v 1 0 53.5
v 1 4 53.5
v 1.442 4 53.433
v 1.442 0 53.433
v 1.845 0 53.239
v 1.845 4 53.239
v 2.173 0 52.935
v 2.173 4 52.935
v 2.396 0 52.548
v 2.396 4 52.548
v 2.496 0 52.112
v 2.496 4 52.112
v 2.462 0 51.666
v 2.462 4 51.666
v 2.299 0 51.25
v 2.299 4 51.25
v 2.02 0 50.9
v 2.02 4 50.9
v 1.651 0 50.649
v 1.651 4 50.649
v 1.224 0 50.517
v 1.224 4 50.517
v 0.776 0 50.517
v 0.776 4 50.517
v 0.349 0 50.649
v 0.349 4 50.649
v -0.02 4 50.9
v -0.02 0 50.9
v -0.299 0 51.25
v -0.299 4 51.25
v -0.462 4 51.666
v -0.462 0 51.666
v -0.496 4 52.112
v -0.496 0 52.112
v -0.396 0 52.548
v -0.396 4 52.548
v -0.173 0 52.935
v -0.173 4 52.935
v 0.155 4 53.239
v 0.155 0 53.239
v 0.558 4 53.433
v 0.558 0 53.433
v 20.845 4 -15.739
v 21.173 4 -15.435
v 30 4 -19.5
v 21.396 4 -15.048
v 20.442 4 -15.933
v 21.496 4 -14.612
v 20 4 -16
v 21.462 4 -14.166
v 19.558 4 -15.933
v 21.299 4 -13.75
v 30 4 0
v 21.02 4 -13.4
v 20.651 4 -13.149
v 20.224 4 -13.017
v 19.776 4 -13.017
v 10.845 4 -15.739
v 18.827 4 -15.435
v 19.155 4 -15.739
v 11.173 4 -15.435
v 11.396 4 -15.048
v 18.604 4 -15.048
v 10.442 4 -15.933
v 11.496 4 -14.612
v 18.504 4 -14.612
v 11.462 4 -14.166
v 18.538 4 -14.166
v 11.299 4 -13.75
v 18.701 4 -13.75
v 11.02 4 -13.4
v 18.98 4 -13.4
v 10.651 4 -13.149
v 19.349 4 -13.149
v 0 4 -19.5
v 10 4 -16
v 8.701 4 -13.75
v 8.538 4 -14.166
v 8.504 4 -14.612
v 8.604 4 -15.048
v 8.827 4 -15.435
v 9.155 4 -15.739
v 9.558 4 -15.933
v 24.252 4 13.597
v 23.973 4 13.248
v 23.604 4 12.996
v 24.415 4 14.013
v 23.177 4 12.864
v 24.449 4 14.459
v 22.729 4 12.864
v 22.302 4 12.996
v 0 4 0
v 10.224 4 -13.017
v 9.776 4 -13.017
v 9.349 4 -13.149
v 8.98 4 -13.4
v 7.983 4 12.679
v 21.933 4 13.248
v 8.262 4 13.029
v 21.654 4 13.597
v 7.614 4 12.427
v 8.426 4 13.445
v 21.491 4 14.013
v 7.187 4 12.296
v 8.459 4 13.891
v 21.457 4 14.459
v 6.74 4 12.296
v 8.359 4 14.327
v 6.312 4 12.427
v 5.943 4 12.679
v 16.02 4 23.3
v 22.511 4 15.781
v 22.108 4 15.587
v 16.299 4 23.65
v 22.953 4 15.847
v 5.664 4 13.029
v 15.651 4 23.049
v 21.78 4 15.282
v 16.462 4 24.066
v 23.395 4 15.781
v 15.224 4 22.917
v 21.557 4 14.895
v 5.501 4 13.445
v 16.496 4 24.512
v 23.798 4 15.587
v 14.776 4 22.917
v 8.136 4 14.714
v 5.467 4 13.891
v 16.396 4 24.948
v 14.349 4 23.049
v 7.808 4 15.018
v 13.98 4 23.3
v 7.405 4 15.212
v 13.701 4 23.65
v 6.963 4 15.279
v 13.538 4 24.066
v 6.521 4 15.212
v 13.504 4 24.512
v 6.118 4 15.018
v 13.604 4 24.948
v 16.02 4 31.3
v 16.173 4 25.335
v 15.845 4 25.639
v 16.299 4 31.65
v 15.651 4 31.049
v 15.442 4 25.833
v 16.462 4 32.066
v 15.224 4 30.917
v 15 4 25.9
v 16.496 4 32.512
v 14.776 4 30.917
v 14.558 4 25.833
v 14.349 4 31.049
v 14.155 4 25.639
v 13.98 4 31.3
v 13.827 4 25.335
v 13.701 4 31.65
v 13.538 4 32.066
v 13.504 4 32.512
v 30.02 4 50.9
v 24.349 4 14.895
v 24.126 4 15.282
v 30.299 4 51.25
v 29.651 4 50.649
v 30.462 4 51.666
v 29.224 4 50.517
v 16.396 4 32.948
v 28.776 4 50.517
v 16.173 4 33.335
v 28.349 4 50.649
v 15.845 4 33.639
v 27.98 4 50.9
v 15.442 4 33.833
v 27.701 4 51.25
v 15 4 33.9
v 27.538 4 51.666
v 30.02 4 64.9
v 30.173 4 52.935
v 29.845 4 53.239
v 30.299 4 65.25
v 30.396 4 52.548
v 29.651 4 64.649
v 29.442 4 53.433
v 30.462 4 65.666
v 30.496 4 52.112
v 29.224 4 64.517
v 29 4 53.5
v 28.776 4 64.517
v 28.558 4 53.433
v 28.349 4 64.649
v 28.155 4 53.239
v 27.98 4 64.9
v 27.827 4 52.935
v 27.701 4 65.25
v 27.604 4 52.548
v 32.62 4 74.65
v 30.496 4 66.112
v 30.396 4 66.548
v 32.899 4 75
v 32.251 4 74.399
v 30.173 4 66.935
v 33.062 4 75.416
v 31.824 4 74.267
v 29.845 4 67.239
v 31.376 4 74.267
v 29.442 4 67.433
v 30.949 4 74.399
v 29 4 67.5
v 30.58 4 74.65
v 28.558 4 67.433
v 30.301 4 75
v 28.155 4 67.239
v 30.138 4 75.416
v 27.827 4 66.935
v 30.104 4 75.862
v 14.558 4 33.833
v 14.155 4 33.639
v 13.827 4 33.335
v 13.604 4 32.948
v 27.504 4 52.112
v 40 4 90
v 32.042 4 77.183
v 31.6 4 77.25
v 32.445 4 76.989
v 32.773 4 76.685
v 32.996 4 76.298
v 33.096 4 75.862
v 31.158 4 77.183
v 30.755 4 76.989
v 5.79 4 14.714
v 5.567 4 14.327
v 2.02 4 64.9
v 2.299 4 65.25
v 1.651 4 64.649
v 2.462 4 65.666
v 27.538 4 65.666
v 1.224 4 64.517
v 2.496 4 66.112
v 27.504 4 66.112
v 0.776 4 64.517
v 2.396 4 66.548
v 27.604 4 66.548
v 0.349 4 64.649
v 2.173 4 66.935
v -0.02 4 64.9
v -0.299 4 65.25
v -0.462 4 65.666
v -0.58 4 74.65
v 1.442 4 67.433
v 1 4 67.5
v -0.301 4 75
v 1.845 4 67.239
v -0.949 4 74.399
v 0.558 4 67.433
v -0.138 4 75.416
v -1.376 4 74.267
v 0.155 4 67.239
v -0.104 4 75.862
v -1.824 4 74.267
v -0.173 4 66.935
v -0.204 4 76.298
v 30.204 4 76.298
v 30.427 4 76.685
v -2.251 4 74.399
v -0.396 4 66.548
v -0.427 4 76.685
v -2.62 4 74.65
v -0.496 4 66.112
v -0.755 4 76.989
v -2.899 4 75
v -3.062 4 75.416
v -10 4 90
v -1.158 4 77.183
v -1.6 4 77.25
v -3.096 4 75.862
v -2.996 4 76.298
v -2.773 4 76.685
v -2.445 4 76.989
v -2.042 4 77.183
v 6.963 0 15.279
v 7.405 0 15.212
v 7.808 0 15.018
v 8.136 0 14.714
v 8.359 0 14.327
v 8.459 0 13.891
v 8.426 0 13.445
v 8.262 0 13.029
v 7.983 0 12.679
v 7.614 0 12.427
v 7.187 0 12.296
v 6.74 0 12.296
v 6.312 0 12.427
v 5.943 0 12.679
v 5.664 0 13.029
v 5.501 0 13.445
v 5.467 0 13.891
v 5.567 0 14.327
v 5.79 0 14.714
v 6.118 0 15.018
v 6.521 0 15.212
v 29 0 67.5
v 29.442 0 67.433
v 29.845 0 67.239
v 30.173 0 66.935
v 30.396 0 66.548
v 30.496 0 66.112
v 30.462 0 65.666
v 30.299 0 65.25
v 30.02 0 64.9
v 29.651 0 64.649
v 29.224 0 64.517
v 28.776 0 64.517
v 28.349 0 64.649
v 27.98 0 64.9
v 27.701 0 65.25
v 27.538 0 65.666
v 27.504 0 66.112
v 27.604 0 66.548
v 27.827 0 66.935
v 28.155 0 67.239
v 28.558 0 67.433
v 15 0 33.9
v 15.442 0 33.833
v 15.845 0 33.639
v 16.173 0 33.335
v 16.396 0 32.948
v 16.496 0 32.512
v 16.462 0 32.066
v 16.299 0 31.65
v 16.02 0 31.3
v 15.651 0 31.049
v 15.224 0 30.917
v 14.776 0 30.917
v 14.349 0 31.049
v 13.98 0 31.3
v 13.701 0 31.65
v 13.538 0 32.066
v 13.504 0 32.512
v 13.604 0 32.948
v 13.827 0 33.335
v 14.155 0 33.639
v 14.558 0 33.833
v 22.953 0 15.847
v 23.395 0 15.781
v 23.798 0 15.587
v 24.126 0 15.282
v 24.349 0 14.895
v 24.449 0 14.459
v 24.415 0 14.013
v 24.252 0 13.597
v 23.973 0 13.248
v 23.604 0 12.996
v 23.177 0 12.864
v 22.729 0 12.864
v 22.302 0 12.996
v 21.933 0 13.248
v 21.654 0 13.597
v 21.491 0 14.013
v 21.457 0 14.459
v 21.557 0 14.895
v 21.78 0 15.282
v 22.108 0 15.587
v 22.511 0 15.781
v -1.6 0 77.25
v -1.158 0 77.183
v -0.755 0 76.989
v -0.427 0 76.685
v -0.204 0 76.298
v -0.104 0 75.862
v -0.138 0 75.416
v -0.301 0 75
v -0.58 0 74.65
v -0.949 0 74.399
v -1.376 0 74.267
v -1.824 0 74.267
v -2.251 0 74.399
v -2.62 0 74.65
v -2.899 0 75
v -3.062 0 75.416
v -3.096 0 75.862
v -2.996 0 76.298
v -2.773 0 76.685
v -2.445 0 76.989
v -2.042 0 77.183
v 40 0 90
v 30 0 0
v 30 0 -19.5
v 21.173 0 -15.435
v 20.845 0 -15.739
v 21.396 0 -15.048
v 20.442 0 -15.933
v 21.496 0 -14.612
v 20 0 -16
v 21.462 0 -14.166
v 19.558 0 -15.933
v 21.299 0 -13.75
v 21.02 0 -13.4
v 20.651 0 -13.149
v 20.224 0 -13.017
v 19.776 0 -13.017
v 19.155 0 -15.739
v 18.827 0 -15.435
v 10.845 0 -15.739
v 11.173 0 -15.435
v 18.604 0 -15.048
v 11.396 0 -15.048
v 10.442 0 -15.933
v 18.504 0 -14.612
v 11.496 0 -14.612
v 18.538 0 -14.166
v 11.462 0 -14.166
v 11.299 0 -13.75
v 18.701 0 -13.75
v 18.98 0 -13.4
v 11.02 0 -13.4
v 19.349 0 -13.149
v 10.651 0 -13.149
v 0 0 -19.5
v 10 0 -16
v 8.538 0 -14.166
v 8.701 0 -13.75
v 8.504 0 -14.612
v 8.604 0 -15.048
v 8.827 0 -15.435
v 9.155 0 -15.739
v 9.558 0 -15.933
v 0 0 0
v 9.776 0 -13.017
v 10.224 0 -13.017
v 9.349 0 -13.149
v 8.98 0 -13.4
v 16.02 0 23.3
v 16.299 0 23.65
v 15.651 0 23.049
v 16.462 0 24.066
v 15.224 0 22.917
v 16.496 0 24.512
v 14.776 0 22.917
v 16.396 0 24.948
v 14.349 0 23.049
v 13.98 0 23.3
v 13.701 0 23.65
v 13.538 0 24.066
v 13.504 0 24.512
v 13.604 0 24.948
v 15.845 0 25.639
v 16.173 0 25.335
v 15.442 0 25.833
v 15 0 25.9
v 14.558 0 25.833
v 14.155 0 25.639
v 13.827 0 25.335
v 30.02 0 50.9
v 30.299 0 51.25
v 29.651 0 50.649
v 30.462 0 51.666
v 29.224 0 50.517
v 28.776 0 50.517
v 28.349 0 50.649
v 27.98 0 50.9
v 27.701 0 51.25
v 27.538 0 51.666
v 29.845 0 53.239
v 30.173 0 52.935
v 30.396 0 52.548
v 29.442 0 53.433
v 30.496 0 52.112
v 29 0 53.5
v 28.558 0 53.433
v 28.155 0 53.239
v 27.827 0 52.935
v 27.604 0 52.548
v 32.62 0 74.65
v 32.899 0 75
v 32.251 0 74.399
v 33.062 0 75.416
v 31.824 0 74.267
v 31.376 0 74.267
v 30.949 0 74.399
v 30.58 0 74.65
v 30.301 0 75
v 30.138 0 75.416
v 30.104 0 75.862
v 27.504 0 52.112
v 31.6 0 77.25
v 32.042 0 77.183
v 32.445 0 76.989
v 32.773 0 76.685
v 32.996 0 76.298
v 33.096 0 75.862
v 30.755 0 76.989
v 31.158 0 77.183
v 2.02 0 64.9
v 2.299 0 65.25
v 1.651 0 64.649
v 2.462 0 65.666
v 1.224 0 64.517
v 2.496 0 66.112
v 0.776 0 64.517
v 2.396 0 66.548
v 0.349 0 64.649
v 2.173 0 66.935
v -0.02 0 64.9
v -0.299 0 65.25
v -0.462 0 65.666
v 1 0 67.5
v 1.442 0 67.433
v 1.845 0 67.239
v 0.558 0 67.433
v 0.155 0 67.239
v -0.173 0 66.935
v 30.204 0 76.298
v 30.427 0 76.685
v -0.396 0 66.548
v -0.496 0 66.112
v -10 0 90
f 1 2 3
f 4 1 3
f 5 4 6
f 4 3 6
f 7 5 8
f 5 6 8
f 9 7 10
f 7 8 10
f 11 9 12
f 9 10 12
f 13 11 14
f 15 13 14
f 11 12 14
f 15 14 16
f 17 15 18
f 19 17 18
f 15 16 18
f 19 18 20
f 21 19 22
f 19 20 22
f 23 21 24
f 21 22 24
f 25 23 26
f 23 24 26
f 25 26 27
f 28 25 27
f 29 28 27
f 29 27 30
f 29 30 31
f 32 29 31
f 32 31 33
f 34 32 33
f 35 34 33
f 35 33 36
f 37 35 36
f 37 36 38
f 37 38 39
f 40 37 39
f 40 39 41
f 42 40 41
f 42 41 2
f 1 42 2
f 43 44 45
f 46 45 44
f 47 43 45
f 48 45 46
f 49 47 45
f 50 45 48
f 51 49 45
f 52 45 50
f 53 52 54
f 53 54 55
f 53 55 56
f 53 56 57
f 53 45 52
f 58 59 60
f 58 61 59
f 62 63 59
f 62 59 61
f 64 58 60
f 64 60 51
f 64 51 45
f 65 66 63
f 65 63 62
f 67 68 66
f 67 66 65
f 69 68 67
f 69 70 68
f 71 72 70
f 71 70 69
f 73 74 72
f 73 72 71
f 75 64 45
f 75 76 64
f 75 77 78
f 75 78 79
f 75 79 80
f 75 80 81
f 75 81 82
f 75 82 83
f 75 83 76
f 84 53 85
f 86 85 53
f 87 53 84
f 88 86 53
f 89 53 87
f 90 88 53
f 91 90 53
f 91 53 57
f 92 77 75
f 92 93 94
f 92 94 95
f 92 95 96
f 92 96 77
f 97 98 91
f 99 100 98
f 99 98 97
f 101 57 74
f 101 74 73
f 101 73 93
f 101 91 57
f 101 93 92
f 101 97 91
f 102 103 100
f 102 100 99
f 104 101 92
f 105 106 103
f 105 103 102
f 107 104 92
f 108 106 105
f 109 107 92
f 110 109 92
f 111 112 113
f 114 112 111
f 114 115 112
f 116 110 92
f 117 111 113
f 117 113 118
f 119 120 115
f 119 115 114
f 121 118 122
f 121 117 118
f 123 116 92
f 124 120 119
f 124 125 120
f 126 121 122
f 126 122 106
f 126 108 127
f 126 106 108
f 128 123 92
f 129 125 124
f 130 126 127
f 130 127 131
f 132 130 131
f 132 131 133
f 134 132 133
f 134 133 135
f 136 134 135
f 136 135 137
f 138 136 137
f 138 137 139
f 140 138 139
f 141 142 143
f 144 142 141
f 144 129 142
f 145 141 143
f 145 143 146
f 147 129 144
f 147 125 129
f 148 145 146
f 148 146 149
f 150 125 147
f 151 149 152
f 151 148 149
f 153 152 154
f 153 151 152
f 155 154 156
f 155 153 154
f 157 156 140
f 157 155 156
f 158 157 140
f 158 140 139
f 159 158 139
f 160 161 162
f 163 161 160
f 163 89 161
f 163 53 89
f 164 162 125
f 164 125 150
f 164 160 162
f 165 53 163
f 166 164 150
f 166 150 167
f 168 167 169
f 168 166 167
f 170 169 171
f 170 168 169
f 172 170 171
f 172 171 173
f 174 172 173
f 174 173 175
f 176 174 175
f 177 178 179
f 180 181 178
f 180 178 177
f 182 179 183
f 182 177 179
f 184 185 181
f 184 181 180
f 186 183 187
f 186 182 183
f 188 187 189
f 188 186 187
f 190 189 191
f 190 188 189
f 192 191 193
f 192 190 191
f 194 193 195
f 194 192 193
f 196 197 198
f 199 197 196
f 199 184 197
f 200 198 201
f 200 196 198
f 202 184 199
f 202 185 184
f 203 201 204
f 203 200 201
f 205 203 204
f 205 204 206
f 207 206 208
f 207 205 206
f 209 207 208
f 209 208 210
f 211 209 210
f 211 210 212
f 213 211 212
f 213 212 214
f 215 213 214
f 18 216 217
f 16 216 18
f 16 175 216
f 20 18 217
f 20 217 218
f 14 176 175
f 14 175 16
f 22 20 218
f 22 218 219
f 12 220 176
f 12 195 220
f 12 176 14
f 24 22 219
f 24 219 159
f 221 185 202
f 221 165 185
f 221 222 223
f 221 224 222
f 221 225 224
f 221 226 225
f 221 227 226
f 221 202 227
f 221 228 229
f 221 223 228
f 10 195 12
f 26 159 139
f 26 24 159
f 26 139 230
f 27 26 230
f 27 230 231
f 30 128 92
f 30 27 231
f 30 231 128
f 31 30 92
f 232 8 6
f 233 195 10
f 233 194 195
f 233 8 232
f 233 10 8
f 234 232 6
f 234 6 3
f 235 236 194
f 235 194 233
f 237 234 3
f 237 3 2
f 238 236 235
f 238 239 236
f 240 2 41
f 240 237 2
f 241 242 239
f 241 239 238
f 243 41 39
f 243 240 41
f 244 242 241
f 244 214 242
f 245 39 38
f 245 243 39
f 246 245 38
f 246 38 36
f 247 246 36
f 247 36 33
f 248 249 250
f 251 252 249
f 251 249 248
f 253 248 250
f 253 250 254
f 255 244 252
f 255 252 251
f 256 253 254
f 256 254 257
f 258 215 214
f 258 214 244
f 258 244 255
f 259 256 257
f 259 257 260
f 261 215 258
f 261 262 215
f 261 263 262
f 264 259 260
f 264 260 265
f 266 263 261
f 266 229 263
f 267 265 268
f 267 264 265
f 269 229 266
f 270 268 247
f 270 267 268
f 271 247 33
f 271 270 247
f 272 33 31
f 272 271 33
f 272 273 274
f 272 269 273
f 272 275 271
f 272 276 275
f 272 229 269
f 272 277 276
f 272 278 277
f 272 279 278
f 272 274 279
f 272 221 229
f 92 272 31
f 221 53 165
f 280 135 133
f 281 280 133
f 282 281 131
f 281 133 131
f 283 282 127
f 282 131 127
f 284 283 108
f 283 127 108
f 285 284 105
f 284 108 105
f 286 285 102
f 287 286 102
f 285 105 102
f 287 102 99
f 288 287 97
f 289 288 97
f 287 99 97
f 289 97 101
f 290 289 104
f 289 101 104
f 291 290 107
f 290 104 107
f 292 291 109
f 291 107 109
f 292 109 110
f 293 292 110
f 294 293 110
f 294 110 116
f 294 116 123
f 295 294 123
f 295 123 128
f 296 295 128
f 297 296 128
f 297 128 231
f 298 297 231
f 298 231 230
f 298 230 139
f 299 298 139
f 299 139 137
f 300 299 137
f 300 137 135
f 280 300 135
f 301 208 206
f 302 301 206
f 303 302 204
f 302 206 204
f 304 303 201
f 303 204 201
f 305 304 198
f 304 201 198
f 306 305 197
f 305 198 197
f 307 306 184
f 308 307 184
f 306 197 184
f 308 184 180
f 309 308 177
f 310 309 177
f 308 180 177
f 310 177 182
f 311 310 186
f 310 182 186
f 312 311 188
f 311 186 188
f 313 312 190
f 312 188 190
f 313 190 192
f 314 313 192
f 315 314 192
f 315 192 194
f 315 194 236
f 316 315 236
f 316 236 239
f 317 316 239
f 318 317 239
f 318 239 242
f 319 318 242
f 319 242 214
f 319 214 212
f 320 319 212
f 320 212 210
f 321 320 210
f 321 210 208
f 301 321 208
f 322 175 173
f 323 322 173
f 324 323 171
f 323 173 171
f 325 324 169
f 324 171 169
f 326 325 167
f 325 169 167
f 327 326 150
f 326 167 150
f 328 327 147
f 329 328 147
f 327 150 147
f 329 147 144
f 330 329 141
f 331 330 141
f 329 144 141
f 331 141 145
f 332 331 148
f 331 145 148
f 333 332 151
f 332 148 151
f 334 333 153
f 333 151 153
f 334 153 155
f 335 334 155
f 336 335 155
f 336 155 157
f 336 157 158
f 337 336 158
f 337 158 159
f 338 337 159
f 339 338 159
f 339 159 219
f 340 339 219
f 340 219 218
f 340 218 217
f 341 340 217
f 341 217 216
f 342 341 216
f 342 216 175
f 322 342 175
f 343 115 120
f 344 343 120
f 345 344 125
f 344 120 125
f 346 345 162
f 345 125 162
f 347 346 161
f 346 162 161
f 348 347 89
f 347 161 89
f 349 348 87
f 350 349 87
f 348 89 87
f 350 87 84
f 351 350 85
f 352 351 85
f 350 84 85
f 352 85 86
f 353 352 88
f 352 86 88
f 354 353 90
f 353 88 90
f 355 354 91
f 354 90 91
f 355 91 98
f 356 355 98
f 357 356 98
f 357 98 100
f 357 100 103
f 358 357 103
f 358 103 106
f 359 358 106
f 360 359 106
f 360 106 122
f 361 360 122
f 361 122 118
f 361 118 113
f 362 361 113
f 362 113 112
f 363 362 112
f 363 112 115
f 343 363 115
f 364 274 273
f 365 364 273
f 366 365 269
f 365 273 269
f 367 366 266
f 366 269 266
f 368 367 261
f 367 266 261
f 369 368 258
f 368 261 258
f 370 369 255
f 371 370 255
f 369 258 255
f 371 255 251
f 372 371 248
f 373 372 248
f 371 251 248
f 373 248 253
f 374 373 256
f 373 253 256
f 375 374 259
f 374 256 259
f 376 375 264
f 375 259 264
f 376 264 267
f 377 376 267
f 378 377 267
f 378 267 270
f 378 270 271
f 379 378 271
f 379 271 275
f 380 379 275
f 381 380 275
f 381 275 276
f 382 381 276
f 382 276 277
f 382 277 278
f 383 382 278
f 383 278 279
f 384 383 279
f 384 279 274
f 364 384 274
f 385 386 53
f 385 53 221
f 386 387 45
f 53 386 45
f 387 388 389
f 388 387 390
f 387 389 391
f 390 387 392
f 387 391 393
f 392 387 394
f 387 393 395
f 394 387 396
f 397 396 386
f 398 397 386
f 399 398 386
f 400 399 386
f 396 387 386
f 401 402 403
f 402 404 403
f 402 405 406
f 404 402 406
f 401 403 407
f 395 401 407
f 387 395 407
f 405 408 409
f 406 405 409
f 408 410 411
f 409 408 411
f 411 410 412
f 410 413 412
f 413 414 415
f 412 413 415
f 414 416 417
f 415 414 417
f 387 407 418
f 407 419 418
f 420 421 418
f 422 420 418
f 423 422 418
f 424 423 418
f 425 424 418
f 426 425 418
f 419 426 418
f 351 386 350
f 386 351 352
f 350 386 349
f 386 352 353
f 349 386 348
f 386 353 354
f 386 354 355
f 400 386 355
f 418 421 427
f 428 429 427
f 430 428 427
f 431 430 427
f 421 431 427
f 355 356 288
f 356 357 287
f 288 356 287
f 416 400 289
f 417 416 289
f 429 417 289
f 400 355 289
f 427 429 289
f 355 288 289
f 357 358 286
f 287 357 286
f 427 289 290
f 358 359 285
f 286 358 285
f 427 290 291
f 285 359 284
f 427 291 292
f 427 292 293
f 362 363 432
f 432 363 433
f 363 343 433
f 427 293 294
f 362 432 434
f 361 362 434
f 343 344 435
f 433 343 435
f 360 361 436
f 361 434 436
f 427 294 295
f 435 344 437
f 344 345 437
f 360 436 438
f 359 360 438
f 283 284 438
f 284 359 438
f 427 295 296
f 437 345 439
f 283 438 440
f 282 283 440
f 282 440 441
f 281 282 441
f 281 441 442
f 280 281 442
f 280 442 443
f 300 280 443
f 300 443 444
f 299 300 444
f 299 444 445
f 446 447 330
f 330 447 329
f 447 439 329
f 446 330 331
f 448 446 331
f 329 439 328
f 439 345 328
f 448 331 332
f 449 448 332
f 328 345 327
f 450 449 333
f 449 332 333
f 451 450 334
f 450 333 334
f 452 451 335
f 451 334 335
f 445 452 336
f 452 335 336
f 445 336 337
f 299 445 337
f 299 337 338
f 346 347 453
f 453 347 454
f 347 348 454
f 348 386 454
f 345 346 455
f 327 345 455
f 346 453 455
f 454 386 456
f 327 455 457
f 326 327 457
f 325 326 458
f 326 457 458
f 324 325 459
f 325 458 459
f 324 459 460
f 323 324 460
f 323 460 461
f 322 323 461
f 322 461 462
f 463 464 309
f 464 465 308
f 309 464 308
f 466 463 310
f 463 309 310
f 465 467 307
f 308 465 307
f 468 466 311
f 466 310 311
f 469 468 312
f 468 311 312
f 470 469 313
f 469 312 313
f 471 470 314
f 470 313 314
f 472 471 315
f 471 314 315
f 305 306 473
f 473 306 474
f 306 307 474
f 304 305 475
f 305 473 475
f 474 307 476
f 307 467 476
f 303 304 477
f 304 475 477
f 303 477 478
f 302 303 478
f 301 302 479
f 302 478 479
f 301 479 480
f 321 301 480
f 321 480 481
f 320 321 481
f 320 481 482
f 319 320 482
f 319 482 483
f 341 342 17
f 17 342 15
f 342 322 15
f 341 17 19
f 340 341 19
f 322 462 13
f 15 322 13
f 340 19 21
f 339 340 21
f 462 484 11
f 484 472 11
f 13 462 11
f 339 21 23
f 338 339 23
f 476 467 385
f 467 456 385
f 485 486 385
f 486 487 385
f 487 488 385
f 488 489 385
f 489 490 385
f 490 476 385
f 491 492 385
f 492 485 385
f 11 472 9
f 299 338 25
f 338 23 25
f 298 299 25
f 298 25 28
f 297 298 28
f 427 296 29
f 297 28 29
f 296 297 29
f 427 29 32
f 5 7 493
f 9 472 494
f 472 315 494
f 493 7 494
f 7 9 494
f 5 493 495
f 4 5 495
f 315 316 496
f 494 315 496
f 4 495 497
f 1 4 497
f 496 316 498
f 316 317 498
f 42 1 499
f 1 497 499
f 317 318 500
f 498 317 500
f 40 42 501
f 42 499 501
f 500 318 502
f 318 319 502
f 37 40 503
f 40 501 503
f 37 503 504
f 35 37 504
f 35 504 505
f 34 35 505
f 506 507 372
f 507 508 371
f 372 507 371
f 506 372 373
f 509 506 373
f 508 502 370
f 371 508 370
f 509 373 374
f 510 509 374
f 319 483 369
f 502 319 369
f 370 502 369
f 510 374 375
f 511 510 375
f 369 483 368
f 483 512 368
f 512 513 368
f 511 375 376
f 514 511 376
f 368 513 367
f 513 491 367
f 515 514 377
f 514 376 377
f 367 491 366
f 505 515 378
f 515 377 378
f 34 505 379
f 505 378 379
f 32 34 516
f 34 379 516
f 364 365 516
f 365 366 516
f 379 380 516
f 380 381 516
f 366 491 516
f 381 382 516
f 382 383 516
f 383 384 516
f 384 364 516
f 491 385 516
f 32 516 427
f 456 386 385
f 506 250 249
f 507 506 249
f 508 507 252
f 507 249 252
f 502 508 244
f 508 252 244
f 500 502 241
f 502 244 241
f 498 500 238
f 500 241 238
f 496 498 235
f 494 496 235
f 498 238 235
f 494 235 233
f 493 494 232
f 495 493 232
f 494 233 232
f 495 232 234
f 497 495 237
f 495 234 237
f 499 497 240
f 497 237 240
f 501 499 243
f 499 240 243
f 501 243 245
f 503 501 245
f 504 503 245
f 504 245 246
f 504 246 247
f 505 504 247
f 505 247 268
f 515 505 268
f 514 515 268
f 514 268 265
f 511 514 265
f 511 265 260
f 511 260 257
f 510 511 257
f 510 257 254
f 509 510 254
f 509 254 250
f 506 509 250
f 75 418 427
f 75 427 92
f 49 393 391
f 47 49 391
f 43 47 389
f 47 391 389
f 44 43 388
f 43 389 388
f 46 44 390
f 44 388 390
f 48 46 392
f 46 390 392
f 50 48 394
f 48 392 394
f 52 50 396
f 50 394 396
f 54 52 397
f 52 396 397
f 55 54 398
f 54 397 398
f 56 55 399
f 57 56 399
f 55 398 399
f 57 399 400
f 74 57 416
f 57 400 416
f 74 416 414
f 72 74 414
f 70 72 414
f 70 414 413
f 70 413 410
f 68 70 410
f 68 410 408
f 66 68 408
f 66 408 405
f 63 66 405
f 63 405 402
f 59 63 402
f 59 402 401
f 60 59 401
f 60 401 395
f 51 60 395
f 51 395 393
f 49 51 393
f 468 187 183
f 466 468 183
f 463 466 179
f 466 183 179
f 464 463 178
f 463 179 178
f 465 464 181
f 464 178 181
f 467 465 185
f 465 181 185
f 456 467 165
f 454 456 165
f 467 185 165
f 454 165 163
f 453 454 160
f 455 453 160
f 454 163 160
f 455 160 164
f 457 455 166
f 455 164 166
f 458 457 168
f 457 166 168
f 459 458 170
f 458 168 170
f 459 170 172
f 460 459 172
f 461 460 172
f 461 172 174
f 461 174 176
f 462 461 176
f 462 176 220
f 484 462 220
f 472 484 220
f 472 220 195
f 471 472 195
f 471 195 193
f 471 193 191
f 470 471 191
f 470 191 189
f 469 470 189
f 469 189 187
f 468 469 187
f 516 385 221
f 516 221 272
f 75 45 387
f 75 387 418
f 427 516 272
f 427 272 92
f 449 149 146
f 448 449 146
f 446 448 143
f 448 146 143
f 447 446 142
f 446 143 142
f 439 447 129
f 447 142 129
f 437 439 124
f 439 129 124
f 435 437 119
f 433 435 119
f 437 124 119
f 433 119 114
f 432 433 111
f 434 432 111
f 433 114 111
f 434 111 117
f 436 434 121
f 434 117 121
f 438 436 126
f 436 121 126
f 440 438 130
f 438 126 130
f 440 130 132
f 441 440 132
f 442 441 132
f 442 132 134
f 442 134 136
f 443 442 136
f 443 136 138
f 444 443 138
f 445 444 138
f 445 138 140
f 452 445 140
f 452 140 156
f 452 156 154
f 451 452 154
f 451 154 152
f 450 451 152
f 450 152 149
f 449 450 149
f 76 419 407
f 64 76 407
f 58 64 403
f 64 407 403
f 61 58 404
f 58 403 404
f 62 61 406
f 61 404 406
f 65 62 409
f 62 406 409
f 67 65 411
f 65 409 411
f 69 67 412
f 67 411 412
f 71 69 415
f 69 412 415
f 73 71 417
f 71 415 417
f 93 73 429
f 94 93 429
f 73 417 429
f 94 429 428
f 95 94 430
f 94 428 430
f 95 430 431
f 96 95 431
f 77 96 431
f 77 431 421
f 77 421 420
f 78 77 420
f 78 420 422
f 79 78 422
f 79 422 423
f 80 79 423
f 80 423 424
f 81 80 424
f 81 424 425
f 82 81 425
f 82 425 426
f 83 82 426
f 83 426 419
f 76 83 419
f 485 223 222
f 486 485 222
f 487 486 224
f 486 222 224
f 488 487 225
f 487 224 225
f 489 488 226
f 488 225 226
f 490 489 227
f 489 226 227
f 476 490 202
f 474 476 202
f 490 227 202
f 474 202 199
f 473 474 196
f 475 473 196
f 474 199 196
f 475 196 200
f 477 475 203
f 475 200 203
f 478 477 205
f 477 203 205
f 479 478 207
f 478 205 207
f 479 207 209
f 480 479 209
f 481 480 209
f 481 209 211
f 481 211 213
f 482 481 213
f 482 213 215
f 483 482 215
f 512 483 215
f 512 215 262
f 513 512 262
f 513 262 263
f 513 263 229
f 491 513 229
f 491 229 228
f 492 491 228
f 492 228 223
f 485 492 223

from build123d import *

# Parameters (mm, degrees)
EXTRUDE_1_DEPTH     = 4
SKETCH_4_R          = 1.5
CUT_EXTRUDE_3_DEPTH = 99.569772243
SKETCH_5_R          = 1.5
CUT_EXTRUDE_4_DEPTH = 99.569772243
SKETCH_9_R          = 1.5
CUT_EXTRUDE_6_DEPTH = 10
SKETCH_10_W         = 30
SKETCH_10_H         = 4
EXTRUDE_2_DEPTH     = 19.5
SKETCH_11_R         = 1.5
CUT_EXTRUDE_7_DEPTH = 99.569772243


with BuildPart() as part:
    # 草图1 → 凸台-拉伸1 (new body)
    with BuildSketch(Plane(origin=(0, 0, 0), x_dir=(1, 0, 0), z_dir=(0, 1, 0))):
        Polygon((0, 0), (30, 0), (40, -90), (-10, -90), align=None)
    extrude(amount=EXTRUDE_1_DEPTH)

    # 草图4 → 切除-拉伸3 (cut, through all)
    with BuildSketch(Plane(origin=(0, 4, 0), x_dir=(1, 0, 0), z_dir=(0, 1, 0))):
        with Locations(Location((1, -66, 0), (0, 0, 270))):
            Circle(SKETCH_4_R)
        with Locations(Location((1, -52, 0), (0, 0, 270))):
            Circle(SKETCH_4_R)
        with Locations(Location((29, -66, 0), (0, 0, 270))):
            Circle(SKETCH_4_R)
        with Locations(Location((29, -52, 0), (0, 0, 270))):
            Circle(SKETCH_4_R)
    extrude(amount=-CUT_EXTRUDE_3_DEPTH, mode=Mode.SUBTRACT)

    # 草图5 → 切除-拉伸4 (cut, through all)
    with BuildSketch(Plane(origin=(0, 4, 0), x_dir=(1, 0, 0), z_dir=(0, 1, 0))):
        with Locations(Location((15, -32.4, 0), (0, 0, 270))):
            Circle(SKETCH_5_R)
        with Locations(Location((15, -24.4, 0), (0, 0, 270))):
            Circle(SKETCH_5_R)
    extrude(amount=-CUT_EXTRUDE_4_DEPTH, mode=Mode.SUBTRACT)

    # 草图9 → 切除-拉伸6 (cut)
    with BuildSketch(Plane(origin=(0, 4, 0), x_dir=(1, 0, 0), z_dir=(0, 1, 0))):
        with Locations(Location((6.963154721, -13.77878744, 0), (0, 0, 270))):
            Circle(SKETCH_9_R)
        with Locations(Location((22.953054881, -14.34720003, 0), (0, 0, 270))):
            Circle(SKETCH_9_R)
        with Locations(Location((-1.6, -75.75, 0), (0, 0, 270))):
            Circle(SKETCH_9_R)
        with Locations(Location((31.6, -75.75, 0), (0, 0, 270))):
            Circle(SKETCH_9_R)
    extrude(amount=-CUT_EXTRUDE_6_DEPTH, mode=Mode.SUBTRACT)

    # 草图10 → 凸台-拉伸2 (add)
    with BuildSketch(Plane(origin=(0, 0, 0), x_dir=(-1, 0, 0), z_dir=(0, 0, -1))):
        with Locations((-15, 2)):
            Rectangle(SKETCH_10_W, SKETCH_10_H)
    extrude(amount=EXTRUDE_2_DEPTH)

    # 草图11 → 切除-拉伸7 (cut, through all)
    with BuildSketch(Plane.XZ):
        with Locations(Location((10, -14.5, 0), (0, 0, 270))):
            Circle(SKETCH_11_R)
        with Locations(Location((20, -14.5, 0), (0, 0, 270))):
            Circle(SKETCH_11_R)
    extrude(amount=-CUT_EXTRUDE_7_DEPTH, mode=Mode.SUBTRACT)


solid = part.part
